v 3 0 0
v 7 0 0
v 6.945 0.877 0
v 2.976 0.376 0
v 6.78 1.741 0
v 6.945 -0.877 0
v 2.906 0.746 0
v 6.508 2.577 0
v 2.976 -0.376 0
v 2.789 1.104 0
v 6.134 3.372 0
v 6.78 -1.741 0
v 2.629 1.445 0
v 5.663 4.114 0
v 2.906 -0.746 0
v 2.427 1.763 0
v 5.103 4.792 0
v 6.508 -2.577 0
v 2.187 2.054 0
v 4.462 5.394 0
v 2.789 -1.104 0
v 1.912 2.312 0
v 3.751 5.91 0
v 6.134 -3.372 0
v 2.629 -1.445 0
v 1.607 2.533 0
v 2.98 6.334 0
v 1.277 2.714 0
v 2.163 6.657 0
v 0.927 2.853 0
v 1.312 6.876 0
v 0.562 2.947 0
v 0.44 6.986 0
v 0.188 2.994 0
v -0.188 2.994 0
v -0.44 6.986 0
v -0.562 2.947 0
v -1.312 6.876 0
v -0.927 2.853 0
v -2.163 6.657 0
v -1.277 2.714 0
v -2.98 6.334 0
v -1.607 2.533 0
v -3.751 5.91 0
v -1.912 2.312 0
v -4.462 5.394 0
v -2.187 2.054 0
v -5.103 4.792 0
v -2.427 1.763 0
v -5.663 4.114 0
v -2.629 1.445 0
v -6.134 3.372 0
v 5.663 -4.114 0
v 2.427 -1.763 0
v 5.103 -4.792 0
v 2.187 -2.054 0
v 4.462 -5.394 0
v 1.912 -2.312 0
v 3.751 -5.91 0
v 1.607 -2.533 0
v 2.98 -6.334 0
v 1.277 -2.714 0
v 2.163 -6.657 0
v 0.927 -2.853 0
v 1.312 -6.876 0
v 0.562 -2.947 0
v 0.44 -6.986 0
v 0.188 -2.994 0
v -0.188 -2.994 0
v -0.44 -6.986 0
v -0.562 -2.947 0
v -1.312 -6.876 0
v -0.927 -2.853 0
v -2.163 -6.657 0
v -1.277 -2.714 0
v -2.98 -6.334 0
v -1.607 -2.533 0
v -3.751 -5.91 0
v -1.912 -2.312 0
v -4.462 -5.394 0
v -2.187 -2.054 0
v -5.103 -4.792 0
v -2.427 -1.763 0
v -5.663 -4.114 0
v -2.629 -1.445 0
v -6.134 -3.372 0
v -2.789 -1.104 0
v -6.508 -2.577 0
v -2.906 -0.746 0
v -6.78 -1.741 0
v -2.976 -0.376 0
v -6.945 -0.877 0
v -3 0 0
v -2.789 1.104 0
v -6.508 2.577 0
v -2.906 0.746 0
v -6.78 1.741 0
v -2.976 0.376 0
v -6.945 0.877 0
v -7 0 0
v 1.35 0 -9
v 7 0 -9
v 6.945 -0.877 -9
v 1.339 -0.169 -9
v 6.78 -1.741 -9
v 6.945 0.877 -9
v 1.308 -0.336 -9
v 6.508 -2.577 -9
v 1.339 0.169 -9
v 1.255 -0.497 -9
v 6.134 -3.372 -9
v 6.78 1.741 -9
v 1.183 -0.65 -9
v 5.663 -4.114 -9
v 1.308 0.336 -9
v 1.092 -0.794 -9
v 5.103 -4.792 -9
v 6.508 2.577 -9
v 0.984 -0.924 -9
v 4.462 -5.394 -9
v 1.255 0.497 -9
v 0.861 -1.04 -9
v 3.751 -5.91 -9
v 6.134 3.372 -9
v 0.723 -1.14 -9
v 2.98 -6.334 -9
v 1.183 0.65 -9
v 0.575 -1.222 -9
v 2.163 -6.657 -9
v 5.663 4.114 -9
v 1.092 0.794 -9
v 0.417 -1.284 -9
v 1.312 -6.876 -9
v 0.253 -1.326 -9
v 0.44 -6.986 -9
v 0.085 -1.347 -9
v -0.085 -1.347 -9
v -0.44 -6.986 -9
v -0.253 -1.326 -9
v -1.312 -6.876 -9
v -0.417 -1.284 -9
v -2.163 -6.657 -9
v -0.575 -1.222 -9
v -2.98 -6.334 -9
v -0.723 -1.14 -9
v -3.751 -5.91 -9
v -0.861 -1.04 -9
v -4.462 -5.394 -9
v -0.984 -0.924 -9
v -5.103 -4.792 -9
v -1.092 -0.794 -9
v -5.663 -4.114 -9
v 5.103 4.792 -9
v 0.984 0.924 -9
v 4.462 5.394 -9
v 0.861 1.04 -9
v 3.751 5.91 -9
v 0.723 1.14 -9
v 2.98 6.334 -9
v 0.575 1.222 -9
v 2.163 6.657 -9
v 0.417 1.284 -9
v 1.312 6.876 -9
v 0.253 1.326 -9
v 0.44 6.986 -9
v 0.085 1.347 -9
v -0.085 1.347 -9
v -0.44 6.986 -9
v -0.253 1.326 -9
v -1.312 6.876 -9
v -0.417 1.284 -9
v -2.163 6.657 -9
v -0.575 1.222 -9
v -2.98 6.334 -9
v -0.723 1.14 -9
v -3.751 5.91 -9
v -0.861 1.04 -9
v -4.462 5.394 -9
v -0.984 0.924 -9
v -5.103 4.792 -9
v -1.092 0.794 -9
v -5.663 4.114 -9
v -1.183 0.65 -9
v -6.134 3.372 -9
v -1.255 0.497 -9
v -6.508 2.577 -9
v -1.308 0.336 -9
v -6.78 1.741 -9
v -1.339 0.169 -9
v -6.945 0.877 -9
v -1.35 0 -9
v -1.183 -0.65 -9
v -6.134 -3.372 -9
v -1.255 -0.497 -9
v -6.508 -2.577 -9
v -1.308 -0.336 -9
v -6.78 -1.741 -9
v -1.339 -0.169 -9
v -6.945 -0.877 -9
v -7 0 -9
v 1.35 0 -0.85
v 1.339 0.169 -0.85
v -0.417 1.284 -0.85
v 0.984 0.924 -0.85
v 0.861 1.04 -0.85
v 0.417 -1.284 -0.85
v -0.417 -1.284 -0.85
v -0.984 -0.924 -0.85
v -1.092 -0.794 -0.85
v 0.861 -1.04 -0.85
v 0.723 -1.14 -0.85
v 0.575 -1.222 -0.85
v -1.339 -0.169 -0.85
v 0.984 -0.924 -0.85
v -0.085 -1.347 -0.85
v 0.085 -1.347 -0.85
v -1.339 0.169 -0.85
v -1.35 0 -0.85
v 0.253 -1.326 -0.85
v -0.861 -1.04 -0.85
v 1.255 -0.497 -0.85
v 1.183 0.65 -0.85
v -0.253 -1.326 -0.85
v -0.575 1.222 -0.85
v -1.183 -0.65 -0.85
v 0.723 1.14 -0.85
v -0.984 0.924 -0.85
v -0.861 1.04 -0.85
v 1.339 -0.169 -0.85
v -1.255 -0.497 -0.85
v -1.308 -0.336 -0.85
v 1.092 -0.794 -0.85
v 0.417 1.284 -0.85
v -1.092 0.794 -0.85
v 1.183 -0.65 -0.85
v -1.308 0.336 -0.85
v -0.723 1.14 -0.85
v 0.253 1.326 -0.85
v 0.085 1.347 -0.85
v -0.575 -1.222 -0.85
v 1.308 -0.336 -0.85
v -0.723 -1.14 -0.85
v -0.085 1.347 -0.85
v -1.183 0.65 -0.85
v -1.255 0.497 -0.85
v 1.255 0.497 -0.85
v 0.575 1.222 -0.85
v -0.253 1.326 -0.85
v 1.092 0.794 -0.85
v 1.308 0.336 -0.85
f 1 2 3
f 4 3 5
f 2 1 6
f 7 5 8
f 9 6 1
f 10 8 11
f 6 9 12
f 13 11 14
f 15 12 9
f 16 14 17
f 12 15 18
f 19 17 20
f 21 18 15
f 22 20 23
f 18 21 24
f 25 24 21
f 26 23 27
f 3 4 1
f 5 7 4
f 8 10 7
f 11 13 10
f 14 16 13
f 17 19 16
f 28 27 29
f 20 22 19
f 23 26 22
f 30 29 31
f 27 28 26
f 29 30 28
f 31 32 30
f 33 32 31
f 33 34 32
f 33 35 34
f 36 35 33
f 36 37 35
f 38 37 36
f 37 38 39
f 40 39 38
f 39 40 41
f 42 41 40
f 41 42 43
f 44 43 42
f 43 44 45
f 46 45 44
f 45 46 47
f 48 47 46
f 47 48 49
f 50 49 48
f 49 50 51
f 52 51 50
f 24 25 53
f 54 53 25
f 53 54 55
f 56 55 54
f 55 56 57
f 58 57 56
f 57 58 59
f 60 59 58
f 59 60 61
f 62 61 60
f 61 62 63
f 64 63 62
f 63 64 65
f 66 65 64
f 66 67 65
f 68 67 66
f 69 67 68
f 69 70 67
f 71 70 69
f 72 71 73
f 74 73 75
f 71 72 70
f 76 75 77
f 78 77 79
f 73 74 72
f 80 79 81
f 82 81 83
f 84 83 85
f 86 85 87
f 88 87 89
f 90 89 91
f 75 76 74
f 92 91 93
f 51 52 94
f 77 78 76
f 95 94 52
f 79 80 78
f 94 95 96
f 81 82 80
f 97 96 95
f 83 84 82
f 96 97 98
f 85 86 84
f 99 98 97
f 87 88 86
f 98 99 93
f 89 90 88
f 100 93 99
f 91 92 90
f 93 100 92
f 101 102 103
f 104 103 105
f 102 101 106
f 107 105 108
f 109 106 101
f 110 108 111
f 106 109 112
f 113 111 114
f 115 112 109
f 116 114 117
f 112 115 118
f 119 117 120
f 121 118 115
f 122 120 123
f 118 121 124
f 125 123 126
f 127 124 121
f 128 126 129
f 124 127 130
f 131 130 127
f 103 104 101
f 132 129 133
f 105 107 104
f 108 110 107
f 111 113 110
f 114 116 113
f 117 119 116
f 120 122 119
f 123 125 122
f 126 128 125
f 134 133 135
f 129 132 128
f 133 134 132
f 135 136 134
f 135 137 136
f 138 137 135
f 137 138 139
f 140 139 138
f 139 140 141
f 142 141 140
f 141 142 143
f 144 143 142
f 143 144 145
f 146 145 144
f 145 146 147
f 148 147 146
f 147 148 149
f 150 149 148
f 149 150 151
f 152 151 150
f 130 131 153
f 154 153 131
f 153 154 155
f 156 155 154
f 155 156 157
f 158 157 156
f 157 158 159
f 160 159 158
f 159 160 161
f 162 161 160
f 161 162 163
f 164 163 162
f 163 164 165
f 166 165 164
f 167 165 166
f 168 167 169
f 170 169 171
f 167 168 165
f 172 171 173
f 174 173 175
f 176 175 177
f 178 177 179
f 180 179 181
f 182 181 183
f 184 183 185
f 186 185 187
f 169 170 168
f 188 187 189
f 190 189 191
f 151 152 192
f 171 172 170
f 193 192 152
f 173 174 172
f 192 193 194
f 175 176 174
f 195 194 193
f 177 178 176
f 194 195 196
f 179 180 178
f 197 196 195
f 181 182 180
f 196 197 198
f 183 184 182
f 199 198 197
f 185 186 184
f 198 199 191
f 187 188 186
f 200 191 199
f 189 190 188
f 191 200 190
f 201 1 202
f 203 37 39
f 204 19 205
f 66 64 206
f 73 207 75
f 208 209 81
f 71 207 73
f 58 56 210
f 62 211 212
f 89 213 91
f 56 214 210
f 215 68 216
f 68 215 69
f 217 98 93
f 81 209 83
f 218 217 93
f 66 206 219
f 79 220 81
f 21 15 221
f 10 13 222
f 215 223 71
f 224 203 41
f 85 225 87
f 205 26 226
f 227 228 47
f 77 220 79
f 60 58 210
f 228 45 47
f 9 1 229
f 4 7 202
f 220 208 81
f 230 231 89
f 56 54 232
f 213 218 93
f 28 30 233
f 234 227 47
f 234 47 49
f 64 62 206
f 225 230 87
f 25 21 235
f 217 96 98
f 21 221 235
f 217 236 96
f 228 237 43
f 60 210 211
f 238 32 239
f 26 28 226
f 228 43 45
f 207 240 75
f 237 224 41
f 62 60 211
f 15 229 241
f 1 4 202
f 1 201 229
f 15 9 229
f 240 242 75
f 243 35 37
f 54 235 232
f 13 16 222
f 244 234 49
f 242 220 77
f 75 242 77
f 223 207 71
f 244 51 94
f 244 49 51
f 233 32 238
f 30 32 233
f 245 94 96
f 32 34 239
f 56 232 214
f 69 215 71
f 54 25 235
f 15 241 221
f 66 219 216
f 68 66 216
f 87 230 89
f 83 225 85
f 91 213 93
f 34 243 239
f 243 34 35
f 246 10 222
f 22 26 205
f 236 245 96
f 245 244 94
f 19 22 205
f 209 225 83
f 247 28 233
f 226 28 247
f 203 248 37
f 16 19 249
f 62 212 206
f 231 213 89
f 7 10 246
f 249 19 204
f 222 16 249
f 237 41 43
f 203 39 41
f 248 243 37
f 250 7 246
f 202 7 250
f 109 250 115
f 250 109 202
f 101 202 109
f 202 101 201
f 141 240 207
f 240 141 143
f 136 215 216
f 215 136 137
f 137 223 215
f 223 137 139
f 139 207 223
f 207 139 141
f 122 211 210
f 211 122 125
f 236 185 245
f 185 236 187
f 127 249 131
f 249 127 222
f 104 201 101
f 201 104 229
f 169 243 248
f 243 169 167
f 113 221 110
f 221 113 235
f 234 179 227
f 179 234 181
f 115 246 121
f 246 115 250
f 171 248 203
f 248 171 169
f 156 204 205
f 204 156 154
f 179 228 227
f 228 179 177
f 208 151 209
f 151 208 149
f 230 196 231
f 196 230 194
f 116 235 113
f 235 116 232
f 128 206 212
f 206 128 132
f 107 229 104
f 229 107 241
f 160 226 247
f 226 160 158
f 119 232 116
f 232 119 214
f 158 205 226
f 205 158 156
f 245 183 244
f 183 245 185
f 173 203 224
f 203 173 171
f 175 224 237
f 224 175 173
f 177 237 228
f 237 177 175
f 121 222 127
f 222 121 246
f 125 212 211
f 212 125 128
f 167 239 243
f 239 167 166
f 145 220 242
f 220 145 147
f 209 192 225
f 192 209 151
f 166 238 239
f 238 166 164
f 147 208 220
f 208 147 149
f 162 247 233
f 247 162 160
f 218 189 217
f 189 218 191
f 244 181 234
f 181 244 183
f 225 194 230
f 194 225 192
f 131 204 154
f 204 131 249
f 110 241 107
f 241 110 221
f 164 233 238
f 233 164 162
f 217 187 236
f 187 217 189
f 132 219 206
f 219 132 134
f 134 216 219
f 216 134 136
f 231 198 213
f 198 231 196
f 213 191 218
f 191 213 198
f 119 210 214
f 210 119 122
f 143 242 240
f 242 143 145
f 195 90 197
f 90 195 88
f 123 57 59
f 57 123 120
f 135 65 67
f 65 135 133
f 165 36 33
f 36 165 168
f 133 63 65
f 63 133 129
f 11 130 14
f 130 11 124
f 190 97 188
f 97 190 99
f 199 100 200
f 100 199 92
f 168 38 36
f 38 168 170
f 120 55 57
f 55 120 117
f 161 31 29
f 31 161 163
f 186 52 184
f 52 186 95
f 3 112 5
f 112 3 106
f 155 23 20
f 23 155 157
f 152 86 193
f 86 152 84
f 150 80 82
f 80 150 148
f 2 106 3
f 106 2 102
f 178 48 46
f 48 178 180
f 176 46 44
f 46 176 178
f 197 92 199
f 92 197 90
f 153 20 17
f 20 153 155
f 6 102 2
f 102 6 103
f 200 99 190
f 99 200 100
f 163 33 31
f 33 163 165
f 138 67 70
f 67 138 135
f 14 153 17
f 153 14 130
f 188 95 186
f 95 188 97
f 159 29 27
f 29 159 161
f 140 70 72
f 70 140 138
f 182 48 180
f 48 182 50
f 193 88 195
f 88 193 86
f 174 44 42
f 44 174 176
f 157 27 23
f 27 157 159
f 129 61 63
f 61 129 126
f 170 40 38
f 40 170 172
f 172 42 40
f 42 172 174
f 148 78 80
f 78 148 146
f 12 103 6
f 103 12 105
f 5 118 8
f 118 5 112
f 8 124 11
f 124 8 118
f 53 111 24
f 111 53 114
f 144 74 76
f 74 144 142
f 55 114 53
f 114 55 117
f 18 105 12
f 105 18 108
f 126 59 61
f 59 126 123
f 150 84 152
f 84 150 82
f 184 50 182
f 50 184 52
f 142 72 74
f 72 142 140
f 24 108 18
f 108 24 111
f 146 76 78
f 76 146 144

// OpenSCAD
$fn = 50;


difference() {
	union() {
		translate(v = [0, 0, -9.0000000000]) {
			cylinder(h = 9, r = 7.0000000000);
		}
	}
	union() {
		translate(v = [0, 0, 0]) {
			rotate(a = [0, 0, 0]) {
				difference() {
					union() {
						translate(v = [0, 0, -9.0000000000]) {
							cylinder(h = 9, r = 1.0000000000);
						}
						translate(v = [0, 0, -0.8500000000]) {
							cylinder(h = 0.8500000000, r1 = 1.3500000000, r2 = 3.0000000000);
						}
						translate(v = [0, 0, -9.0000000000]) {
							cylinder(h = 9, r = 1.3500000000);
						}
						translate(v = [0, 0, -9.0000000000]) {
							cylinder(h = 9, r = 1.0000000000);
						}
					}
					union();
				}
			}
		}
	}
}
